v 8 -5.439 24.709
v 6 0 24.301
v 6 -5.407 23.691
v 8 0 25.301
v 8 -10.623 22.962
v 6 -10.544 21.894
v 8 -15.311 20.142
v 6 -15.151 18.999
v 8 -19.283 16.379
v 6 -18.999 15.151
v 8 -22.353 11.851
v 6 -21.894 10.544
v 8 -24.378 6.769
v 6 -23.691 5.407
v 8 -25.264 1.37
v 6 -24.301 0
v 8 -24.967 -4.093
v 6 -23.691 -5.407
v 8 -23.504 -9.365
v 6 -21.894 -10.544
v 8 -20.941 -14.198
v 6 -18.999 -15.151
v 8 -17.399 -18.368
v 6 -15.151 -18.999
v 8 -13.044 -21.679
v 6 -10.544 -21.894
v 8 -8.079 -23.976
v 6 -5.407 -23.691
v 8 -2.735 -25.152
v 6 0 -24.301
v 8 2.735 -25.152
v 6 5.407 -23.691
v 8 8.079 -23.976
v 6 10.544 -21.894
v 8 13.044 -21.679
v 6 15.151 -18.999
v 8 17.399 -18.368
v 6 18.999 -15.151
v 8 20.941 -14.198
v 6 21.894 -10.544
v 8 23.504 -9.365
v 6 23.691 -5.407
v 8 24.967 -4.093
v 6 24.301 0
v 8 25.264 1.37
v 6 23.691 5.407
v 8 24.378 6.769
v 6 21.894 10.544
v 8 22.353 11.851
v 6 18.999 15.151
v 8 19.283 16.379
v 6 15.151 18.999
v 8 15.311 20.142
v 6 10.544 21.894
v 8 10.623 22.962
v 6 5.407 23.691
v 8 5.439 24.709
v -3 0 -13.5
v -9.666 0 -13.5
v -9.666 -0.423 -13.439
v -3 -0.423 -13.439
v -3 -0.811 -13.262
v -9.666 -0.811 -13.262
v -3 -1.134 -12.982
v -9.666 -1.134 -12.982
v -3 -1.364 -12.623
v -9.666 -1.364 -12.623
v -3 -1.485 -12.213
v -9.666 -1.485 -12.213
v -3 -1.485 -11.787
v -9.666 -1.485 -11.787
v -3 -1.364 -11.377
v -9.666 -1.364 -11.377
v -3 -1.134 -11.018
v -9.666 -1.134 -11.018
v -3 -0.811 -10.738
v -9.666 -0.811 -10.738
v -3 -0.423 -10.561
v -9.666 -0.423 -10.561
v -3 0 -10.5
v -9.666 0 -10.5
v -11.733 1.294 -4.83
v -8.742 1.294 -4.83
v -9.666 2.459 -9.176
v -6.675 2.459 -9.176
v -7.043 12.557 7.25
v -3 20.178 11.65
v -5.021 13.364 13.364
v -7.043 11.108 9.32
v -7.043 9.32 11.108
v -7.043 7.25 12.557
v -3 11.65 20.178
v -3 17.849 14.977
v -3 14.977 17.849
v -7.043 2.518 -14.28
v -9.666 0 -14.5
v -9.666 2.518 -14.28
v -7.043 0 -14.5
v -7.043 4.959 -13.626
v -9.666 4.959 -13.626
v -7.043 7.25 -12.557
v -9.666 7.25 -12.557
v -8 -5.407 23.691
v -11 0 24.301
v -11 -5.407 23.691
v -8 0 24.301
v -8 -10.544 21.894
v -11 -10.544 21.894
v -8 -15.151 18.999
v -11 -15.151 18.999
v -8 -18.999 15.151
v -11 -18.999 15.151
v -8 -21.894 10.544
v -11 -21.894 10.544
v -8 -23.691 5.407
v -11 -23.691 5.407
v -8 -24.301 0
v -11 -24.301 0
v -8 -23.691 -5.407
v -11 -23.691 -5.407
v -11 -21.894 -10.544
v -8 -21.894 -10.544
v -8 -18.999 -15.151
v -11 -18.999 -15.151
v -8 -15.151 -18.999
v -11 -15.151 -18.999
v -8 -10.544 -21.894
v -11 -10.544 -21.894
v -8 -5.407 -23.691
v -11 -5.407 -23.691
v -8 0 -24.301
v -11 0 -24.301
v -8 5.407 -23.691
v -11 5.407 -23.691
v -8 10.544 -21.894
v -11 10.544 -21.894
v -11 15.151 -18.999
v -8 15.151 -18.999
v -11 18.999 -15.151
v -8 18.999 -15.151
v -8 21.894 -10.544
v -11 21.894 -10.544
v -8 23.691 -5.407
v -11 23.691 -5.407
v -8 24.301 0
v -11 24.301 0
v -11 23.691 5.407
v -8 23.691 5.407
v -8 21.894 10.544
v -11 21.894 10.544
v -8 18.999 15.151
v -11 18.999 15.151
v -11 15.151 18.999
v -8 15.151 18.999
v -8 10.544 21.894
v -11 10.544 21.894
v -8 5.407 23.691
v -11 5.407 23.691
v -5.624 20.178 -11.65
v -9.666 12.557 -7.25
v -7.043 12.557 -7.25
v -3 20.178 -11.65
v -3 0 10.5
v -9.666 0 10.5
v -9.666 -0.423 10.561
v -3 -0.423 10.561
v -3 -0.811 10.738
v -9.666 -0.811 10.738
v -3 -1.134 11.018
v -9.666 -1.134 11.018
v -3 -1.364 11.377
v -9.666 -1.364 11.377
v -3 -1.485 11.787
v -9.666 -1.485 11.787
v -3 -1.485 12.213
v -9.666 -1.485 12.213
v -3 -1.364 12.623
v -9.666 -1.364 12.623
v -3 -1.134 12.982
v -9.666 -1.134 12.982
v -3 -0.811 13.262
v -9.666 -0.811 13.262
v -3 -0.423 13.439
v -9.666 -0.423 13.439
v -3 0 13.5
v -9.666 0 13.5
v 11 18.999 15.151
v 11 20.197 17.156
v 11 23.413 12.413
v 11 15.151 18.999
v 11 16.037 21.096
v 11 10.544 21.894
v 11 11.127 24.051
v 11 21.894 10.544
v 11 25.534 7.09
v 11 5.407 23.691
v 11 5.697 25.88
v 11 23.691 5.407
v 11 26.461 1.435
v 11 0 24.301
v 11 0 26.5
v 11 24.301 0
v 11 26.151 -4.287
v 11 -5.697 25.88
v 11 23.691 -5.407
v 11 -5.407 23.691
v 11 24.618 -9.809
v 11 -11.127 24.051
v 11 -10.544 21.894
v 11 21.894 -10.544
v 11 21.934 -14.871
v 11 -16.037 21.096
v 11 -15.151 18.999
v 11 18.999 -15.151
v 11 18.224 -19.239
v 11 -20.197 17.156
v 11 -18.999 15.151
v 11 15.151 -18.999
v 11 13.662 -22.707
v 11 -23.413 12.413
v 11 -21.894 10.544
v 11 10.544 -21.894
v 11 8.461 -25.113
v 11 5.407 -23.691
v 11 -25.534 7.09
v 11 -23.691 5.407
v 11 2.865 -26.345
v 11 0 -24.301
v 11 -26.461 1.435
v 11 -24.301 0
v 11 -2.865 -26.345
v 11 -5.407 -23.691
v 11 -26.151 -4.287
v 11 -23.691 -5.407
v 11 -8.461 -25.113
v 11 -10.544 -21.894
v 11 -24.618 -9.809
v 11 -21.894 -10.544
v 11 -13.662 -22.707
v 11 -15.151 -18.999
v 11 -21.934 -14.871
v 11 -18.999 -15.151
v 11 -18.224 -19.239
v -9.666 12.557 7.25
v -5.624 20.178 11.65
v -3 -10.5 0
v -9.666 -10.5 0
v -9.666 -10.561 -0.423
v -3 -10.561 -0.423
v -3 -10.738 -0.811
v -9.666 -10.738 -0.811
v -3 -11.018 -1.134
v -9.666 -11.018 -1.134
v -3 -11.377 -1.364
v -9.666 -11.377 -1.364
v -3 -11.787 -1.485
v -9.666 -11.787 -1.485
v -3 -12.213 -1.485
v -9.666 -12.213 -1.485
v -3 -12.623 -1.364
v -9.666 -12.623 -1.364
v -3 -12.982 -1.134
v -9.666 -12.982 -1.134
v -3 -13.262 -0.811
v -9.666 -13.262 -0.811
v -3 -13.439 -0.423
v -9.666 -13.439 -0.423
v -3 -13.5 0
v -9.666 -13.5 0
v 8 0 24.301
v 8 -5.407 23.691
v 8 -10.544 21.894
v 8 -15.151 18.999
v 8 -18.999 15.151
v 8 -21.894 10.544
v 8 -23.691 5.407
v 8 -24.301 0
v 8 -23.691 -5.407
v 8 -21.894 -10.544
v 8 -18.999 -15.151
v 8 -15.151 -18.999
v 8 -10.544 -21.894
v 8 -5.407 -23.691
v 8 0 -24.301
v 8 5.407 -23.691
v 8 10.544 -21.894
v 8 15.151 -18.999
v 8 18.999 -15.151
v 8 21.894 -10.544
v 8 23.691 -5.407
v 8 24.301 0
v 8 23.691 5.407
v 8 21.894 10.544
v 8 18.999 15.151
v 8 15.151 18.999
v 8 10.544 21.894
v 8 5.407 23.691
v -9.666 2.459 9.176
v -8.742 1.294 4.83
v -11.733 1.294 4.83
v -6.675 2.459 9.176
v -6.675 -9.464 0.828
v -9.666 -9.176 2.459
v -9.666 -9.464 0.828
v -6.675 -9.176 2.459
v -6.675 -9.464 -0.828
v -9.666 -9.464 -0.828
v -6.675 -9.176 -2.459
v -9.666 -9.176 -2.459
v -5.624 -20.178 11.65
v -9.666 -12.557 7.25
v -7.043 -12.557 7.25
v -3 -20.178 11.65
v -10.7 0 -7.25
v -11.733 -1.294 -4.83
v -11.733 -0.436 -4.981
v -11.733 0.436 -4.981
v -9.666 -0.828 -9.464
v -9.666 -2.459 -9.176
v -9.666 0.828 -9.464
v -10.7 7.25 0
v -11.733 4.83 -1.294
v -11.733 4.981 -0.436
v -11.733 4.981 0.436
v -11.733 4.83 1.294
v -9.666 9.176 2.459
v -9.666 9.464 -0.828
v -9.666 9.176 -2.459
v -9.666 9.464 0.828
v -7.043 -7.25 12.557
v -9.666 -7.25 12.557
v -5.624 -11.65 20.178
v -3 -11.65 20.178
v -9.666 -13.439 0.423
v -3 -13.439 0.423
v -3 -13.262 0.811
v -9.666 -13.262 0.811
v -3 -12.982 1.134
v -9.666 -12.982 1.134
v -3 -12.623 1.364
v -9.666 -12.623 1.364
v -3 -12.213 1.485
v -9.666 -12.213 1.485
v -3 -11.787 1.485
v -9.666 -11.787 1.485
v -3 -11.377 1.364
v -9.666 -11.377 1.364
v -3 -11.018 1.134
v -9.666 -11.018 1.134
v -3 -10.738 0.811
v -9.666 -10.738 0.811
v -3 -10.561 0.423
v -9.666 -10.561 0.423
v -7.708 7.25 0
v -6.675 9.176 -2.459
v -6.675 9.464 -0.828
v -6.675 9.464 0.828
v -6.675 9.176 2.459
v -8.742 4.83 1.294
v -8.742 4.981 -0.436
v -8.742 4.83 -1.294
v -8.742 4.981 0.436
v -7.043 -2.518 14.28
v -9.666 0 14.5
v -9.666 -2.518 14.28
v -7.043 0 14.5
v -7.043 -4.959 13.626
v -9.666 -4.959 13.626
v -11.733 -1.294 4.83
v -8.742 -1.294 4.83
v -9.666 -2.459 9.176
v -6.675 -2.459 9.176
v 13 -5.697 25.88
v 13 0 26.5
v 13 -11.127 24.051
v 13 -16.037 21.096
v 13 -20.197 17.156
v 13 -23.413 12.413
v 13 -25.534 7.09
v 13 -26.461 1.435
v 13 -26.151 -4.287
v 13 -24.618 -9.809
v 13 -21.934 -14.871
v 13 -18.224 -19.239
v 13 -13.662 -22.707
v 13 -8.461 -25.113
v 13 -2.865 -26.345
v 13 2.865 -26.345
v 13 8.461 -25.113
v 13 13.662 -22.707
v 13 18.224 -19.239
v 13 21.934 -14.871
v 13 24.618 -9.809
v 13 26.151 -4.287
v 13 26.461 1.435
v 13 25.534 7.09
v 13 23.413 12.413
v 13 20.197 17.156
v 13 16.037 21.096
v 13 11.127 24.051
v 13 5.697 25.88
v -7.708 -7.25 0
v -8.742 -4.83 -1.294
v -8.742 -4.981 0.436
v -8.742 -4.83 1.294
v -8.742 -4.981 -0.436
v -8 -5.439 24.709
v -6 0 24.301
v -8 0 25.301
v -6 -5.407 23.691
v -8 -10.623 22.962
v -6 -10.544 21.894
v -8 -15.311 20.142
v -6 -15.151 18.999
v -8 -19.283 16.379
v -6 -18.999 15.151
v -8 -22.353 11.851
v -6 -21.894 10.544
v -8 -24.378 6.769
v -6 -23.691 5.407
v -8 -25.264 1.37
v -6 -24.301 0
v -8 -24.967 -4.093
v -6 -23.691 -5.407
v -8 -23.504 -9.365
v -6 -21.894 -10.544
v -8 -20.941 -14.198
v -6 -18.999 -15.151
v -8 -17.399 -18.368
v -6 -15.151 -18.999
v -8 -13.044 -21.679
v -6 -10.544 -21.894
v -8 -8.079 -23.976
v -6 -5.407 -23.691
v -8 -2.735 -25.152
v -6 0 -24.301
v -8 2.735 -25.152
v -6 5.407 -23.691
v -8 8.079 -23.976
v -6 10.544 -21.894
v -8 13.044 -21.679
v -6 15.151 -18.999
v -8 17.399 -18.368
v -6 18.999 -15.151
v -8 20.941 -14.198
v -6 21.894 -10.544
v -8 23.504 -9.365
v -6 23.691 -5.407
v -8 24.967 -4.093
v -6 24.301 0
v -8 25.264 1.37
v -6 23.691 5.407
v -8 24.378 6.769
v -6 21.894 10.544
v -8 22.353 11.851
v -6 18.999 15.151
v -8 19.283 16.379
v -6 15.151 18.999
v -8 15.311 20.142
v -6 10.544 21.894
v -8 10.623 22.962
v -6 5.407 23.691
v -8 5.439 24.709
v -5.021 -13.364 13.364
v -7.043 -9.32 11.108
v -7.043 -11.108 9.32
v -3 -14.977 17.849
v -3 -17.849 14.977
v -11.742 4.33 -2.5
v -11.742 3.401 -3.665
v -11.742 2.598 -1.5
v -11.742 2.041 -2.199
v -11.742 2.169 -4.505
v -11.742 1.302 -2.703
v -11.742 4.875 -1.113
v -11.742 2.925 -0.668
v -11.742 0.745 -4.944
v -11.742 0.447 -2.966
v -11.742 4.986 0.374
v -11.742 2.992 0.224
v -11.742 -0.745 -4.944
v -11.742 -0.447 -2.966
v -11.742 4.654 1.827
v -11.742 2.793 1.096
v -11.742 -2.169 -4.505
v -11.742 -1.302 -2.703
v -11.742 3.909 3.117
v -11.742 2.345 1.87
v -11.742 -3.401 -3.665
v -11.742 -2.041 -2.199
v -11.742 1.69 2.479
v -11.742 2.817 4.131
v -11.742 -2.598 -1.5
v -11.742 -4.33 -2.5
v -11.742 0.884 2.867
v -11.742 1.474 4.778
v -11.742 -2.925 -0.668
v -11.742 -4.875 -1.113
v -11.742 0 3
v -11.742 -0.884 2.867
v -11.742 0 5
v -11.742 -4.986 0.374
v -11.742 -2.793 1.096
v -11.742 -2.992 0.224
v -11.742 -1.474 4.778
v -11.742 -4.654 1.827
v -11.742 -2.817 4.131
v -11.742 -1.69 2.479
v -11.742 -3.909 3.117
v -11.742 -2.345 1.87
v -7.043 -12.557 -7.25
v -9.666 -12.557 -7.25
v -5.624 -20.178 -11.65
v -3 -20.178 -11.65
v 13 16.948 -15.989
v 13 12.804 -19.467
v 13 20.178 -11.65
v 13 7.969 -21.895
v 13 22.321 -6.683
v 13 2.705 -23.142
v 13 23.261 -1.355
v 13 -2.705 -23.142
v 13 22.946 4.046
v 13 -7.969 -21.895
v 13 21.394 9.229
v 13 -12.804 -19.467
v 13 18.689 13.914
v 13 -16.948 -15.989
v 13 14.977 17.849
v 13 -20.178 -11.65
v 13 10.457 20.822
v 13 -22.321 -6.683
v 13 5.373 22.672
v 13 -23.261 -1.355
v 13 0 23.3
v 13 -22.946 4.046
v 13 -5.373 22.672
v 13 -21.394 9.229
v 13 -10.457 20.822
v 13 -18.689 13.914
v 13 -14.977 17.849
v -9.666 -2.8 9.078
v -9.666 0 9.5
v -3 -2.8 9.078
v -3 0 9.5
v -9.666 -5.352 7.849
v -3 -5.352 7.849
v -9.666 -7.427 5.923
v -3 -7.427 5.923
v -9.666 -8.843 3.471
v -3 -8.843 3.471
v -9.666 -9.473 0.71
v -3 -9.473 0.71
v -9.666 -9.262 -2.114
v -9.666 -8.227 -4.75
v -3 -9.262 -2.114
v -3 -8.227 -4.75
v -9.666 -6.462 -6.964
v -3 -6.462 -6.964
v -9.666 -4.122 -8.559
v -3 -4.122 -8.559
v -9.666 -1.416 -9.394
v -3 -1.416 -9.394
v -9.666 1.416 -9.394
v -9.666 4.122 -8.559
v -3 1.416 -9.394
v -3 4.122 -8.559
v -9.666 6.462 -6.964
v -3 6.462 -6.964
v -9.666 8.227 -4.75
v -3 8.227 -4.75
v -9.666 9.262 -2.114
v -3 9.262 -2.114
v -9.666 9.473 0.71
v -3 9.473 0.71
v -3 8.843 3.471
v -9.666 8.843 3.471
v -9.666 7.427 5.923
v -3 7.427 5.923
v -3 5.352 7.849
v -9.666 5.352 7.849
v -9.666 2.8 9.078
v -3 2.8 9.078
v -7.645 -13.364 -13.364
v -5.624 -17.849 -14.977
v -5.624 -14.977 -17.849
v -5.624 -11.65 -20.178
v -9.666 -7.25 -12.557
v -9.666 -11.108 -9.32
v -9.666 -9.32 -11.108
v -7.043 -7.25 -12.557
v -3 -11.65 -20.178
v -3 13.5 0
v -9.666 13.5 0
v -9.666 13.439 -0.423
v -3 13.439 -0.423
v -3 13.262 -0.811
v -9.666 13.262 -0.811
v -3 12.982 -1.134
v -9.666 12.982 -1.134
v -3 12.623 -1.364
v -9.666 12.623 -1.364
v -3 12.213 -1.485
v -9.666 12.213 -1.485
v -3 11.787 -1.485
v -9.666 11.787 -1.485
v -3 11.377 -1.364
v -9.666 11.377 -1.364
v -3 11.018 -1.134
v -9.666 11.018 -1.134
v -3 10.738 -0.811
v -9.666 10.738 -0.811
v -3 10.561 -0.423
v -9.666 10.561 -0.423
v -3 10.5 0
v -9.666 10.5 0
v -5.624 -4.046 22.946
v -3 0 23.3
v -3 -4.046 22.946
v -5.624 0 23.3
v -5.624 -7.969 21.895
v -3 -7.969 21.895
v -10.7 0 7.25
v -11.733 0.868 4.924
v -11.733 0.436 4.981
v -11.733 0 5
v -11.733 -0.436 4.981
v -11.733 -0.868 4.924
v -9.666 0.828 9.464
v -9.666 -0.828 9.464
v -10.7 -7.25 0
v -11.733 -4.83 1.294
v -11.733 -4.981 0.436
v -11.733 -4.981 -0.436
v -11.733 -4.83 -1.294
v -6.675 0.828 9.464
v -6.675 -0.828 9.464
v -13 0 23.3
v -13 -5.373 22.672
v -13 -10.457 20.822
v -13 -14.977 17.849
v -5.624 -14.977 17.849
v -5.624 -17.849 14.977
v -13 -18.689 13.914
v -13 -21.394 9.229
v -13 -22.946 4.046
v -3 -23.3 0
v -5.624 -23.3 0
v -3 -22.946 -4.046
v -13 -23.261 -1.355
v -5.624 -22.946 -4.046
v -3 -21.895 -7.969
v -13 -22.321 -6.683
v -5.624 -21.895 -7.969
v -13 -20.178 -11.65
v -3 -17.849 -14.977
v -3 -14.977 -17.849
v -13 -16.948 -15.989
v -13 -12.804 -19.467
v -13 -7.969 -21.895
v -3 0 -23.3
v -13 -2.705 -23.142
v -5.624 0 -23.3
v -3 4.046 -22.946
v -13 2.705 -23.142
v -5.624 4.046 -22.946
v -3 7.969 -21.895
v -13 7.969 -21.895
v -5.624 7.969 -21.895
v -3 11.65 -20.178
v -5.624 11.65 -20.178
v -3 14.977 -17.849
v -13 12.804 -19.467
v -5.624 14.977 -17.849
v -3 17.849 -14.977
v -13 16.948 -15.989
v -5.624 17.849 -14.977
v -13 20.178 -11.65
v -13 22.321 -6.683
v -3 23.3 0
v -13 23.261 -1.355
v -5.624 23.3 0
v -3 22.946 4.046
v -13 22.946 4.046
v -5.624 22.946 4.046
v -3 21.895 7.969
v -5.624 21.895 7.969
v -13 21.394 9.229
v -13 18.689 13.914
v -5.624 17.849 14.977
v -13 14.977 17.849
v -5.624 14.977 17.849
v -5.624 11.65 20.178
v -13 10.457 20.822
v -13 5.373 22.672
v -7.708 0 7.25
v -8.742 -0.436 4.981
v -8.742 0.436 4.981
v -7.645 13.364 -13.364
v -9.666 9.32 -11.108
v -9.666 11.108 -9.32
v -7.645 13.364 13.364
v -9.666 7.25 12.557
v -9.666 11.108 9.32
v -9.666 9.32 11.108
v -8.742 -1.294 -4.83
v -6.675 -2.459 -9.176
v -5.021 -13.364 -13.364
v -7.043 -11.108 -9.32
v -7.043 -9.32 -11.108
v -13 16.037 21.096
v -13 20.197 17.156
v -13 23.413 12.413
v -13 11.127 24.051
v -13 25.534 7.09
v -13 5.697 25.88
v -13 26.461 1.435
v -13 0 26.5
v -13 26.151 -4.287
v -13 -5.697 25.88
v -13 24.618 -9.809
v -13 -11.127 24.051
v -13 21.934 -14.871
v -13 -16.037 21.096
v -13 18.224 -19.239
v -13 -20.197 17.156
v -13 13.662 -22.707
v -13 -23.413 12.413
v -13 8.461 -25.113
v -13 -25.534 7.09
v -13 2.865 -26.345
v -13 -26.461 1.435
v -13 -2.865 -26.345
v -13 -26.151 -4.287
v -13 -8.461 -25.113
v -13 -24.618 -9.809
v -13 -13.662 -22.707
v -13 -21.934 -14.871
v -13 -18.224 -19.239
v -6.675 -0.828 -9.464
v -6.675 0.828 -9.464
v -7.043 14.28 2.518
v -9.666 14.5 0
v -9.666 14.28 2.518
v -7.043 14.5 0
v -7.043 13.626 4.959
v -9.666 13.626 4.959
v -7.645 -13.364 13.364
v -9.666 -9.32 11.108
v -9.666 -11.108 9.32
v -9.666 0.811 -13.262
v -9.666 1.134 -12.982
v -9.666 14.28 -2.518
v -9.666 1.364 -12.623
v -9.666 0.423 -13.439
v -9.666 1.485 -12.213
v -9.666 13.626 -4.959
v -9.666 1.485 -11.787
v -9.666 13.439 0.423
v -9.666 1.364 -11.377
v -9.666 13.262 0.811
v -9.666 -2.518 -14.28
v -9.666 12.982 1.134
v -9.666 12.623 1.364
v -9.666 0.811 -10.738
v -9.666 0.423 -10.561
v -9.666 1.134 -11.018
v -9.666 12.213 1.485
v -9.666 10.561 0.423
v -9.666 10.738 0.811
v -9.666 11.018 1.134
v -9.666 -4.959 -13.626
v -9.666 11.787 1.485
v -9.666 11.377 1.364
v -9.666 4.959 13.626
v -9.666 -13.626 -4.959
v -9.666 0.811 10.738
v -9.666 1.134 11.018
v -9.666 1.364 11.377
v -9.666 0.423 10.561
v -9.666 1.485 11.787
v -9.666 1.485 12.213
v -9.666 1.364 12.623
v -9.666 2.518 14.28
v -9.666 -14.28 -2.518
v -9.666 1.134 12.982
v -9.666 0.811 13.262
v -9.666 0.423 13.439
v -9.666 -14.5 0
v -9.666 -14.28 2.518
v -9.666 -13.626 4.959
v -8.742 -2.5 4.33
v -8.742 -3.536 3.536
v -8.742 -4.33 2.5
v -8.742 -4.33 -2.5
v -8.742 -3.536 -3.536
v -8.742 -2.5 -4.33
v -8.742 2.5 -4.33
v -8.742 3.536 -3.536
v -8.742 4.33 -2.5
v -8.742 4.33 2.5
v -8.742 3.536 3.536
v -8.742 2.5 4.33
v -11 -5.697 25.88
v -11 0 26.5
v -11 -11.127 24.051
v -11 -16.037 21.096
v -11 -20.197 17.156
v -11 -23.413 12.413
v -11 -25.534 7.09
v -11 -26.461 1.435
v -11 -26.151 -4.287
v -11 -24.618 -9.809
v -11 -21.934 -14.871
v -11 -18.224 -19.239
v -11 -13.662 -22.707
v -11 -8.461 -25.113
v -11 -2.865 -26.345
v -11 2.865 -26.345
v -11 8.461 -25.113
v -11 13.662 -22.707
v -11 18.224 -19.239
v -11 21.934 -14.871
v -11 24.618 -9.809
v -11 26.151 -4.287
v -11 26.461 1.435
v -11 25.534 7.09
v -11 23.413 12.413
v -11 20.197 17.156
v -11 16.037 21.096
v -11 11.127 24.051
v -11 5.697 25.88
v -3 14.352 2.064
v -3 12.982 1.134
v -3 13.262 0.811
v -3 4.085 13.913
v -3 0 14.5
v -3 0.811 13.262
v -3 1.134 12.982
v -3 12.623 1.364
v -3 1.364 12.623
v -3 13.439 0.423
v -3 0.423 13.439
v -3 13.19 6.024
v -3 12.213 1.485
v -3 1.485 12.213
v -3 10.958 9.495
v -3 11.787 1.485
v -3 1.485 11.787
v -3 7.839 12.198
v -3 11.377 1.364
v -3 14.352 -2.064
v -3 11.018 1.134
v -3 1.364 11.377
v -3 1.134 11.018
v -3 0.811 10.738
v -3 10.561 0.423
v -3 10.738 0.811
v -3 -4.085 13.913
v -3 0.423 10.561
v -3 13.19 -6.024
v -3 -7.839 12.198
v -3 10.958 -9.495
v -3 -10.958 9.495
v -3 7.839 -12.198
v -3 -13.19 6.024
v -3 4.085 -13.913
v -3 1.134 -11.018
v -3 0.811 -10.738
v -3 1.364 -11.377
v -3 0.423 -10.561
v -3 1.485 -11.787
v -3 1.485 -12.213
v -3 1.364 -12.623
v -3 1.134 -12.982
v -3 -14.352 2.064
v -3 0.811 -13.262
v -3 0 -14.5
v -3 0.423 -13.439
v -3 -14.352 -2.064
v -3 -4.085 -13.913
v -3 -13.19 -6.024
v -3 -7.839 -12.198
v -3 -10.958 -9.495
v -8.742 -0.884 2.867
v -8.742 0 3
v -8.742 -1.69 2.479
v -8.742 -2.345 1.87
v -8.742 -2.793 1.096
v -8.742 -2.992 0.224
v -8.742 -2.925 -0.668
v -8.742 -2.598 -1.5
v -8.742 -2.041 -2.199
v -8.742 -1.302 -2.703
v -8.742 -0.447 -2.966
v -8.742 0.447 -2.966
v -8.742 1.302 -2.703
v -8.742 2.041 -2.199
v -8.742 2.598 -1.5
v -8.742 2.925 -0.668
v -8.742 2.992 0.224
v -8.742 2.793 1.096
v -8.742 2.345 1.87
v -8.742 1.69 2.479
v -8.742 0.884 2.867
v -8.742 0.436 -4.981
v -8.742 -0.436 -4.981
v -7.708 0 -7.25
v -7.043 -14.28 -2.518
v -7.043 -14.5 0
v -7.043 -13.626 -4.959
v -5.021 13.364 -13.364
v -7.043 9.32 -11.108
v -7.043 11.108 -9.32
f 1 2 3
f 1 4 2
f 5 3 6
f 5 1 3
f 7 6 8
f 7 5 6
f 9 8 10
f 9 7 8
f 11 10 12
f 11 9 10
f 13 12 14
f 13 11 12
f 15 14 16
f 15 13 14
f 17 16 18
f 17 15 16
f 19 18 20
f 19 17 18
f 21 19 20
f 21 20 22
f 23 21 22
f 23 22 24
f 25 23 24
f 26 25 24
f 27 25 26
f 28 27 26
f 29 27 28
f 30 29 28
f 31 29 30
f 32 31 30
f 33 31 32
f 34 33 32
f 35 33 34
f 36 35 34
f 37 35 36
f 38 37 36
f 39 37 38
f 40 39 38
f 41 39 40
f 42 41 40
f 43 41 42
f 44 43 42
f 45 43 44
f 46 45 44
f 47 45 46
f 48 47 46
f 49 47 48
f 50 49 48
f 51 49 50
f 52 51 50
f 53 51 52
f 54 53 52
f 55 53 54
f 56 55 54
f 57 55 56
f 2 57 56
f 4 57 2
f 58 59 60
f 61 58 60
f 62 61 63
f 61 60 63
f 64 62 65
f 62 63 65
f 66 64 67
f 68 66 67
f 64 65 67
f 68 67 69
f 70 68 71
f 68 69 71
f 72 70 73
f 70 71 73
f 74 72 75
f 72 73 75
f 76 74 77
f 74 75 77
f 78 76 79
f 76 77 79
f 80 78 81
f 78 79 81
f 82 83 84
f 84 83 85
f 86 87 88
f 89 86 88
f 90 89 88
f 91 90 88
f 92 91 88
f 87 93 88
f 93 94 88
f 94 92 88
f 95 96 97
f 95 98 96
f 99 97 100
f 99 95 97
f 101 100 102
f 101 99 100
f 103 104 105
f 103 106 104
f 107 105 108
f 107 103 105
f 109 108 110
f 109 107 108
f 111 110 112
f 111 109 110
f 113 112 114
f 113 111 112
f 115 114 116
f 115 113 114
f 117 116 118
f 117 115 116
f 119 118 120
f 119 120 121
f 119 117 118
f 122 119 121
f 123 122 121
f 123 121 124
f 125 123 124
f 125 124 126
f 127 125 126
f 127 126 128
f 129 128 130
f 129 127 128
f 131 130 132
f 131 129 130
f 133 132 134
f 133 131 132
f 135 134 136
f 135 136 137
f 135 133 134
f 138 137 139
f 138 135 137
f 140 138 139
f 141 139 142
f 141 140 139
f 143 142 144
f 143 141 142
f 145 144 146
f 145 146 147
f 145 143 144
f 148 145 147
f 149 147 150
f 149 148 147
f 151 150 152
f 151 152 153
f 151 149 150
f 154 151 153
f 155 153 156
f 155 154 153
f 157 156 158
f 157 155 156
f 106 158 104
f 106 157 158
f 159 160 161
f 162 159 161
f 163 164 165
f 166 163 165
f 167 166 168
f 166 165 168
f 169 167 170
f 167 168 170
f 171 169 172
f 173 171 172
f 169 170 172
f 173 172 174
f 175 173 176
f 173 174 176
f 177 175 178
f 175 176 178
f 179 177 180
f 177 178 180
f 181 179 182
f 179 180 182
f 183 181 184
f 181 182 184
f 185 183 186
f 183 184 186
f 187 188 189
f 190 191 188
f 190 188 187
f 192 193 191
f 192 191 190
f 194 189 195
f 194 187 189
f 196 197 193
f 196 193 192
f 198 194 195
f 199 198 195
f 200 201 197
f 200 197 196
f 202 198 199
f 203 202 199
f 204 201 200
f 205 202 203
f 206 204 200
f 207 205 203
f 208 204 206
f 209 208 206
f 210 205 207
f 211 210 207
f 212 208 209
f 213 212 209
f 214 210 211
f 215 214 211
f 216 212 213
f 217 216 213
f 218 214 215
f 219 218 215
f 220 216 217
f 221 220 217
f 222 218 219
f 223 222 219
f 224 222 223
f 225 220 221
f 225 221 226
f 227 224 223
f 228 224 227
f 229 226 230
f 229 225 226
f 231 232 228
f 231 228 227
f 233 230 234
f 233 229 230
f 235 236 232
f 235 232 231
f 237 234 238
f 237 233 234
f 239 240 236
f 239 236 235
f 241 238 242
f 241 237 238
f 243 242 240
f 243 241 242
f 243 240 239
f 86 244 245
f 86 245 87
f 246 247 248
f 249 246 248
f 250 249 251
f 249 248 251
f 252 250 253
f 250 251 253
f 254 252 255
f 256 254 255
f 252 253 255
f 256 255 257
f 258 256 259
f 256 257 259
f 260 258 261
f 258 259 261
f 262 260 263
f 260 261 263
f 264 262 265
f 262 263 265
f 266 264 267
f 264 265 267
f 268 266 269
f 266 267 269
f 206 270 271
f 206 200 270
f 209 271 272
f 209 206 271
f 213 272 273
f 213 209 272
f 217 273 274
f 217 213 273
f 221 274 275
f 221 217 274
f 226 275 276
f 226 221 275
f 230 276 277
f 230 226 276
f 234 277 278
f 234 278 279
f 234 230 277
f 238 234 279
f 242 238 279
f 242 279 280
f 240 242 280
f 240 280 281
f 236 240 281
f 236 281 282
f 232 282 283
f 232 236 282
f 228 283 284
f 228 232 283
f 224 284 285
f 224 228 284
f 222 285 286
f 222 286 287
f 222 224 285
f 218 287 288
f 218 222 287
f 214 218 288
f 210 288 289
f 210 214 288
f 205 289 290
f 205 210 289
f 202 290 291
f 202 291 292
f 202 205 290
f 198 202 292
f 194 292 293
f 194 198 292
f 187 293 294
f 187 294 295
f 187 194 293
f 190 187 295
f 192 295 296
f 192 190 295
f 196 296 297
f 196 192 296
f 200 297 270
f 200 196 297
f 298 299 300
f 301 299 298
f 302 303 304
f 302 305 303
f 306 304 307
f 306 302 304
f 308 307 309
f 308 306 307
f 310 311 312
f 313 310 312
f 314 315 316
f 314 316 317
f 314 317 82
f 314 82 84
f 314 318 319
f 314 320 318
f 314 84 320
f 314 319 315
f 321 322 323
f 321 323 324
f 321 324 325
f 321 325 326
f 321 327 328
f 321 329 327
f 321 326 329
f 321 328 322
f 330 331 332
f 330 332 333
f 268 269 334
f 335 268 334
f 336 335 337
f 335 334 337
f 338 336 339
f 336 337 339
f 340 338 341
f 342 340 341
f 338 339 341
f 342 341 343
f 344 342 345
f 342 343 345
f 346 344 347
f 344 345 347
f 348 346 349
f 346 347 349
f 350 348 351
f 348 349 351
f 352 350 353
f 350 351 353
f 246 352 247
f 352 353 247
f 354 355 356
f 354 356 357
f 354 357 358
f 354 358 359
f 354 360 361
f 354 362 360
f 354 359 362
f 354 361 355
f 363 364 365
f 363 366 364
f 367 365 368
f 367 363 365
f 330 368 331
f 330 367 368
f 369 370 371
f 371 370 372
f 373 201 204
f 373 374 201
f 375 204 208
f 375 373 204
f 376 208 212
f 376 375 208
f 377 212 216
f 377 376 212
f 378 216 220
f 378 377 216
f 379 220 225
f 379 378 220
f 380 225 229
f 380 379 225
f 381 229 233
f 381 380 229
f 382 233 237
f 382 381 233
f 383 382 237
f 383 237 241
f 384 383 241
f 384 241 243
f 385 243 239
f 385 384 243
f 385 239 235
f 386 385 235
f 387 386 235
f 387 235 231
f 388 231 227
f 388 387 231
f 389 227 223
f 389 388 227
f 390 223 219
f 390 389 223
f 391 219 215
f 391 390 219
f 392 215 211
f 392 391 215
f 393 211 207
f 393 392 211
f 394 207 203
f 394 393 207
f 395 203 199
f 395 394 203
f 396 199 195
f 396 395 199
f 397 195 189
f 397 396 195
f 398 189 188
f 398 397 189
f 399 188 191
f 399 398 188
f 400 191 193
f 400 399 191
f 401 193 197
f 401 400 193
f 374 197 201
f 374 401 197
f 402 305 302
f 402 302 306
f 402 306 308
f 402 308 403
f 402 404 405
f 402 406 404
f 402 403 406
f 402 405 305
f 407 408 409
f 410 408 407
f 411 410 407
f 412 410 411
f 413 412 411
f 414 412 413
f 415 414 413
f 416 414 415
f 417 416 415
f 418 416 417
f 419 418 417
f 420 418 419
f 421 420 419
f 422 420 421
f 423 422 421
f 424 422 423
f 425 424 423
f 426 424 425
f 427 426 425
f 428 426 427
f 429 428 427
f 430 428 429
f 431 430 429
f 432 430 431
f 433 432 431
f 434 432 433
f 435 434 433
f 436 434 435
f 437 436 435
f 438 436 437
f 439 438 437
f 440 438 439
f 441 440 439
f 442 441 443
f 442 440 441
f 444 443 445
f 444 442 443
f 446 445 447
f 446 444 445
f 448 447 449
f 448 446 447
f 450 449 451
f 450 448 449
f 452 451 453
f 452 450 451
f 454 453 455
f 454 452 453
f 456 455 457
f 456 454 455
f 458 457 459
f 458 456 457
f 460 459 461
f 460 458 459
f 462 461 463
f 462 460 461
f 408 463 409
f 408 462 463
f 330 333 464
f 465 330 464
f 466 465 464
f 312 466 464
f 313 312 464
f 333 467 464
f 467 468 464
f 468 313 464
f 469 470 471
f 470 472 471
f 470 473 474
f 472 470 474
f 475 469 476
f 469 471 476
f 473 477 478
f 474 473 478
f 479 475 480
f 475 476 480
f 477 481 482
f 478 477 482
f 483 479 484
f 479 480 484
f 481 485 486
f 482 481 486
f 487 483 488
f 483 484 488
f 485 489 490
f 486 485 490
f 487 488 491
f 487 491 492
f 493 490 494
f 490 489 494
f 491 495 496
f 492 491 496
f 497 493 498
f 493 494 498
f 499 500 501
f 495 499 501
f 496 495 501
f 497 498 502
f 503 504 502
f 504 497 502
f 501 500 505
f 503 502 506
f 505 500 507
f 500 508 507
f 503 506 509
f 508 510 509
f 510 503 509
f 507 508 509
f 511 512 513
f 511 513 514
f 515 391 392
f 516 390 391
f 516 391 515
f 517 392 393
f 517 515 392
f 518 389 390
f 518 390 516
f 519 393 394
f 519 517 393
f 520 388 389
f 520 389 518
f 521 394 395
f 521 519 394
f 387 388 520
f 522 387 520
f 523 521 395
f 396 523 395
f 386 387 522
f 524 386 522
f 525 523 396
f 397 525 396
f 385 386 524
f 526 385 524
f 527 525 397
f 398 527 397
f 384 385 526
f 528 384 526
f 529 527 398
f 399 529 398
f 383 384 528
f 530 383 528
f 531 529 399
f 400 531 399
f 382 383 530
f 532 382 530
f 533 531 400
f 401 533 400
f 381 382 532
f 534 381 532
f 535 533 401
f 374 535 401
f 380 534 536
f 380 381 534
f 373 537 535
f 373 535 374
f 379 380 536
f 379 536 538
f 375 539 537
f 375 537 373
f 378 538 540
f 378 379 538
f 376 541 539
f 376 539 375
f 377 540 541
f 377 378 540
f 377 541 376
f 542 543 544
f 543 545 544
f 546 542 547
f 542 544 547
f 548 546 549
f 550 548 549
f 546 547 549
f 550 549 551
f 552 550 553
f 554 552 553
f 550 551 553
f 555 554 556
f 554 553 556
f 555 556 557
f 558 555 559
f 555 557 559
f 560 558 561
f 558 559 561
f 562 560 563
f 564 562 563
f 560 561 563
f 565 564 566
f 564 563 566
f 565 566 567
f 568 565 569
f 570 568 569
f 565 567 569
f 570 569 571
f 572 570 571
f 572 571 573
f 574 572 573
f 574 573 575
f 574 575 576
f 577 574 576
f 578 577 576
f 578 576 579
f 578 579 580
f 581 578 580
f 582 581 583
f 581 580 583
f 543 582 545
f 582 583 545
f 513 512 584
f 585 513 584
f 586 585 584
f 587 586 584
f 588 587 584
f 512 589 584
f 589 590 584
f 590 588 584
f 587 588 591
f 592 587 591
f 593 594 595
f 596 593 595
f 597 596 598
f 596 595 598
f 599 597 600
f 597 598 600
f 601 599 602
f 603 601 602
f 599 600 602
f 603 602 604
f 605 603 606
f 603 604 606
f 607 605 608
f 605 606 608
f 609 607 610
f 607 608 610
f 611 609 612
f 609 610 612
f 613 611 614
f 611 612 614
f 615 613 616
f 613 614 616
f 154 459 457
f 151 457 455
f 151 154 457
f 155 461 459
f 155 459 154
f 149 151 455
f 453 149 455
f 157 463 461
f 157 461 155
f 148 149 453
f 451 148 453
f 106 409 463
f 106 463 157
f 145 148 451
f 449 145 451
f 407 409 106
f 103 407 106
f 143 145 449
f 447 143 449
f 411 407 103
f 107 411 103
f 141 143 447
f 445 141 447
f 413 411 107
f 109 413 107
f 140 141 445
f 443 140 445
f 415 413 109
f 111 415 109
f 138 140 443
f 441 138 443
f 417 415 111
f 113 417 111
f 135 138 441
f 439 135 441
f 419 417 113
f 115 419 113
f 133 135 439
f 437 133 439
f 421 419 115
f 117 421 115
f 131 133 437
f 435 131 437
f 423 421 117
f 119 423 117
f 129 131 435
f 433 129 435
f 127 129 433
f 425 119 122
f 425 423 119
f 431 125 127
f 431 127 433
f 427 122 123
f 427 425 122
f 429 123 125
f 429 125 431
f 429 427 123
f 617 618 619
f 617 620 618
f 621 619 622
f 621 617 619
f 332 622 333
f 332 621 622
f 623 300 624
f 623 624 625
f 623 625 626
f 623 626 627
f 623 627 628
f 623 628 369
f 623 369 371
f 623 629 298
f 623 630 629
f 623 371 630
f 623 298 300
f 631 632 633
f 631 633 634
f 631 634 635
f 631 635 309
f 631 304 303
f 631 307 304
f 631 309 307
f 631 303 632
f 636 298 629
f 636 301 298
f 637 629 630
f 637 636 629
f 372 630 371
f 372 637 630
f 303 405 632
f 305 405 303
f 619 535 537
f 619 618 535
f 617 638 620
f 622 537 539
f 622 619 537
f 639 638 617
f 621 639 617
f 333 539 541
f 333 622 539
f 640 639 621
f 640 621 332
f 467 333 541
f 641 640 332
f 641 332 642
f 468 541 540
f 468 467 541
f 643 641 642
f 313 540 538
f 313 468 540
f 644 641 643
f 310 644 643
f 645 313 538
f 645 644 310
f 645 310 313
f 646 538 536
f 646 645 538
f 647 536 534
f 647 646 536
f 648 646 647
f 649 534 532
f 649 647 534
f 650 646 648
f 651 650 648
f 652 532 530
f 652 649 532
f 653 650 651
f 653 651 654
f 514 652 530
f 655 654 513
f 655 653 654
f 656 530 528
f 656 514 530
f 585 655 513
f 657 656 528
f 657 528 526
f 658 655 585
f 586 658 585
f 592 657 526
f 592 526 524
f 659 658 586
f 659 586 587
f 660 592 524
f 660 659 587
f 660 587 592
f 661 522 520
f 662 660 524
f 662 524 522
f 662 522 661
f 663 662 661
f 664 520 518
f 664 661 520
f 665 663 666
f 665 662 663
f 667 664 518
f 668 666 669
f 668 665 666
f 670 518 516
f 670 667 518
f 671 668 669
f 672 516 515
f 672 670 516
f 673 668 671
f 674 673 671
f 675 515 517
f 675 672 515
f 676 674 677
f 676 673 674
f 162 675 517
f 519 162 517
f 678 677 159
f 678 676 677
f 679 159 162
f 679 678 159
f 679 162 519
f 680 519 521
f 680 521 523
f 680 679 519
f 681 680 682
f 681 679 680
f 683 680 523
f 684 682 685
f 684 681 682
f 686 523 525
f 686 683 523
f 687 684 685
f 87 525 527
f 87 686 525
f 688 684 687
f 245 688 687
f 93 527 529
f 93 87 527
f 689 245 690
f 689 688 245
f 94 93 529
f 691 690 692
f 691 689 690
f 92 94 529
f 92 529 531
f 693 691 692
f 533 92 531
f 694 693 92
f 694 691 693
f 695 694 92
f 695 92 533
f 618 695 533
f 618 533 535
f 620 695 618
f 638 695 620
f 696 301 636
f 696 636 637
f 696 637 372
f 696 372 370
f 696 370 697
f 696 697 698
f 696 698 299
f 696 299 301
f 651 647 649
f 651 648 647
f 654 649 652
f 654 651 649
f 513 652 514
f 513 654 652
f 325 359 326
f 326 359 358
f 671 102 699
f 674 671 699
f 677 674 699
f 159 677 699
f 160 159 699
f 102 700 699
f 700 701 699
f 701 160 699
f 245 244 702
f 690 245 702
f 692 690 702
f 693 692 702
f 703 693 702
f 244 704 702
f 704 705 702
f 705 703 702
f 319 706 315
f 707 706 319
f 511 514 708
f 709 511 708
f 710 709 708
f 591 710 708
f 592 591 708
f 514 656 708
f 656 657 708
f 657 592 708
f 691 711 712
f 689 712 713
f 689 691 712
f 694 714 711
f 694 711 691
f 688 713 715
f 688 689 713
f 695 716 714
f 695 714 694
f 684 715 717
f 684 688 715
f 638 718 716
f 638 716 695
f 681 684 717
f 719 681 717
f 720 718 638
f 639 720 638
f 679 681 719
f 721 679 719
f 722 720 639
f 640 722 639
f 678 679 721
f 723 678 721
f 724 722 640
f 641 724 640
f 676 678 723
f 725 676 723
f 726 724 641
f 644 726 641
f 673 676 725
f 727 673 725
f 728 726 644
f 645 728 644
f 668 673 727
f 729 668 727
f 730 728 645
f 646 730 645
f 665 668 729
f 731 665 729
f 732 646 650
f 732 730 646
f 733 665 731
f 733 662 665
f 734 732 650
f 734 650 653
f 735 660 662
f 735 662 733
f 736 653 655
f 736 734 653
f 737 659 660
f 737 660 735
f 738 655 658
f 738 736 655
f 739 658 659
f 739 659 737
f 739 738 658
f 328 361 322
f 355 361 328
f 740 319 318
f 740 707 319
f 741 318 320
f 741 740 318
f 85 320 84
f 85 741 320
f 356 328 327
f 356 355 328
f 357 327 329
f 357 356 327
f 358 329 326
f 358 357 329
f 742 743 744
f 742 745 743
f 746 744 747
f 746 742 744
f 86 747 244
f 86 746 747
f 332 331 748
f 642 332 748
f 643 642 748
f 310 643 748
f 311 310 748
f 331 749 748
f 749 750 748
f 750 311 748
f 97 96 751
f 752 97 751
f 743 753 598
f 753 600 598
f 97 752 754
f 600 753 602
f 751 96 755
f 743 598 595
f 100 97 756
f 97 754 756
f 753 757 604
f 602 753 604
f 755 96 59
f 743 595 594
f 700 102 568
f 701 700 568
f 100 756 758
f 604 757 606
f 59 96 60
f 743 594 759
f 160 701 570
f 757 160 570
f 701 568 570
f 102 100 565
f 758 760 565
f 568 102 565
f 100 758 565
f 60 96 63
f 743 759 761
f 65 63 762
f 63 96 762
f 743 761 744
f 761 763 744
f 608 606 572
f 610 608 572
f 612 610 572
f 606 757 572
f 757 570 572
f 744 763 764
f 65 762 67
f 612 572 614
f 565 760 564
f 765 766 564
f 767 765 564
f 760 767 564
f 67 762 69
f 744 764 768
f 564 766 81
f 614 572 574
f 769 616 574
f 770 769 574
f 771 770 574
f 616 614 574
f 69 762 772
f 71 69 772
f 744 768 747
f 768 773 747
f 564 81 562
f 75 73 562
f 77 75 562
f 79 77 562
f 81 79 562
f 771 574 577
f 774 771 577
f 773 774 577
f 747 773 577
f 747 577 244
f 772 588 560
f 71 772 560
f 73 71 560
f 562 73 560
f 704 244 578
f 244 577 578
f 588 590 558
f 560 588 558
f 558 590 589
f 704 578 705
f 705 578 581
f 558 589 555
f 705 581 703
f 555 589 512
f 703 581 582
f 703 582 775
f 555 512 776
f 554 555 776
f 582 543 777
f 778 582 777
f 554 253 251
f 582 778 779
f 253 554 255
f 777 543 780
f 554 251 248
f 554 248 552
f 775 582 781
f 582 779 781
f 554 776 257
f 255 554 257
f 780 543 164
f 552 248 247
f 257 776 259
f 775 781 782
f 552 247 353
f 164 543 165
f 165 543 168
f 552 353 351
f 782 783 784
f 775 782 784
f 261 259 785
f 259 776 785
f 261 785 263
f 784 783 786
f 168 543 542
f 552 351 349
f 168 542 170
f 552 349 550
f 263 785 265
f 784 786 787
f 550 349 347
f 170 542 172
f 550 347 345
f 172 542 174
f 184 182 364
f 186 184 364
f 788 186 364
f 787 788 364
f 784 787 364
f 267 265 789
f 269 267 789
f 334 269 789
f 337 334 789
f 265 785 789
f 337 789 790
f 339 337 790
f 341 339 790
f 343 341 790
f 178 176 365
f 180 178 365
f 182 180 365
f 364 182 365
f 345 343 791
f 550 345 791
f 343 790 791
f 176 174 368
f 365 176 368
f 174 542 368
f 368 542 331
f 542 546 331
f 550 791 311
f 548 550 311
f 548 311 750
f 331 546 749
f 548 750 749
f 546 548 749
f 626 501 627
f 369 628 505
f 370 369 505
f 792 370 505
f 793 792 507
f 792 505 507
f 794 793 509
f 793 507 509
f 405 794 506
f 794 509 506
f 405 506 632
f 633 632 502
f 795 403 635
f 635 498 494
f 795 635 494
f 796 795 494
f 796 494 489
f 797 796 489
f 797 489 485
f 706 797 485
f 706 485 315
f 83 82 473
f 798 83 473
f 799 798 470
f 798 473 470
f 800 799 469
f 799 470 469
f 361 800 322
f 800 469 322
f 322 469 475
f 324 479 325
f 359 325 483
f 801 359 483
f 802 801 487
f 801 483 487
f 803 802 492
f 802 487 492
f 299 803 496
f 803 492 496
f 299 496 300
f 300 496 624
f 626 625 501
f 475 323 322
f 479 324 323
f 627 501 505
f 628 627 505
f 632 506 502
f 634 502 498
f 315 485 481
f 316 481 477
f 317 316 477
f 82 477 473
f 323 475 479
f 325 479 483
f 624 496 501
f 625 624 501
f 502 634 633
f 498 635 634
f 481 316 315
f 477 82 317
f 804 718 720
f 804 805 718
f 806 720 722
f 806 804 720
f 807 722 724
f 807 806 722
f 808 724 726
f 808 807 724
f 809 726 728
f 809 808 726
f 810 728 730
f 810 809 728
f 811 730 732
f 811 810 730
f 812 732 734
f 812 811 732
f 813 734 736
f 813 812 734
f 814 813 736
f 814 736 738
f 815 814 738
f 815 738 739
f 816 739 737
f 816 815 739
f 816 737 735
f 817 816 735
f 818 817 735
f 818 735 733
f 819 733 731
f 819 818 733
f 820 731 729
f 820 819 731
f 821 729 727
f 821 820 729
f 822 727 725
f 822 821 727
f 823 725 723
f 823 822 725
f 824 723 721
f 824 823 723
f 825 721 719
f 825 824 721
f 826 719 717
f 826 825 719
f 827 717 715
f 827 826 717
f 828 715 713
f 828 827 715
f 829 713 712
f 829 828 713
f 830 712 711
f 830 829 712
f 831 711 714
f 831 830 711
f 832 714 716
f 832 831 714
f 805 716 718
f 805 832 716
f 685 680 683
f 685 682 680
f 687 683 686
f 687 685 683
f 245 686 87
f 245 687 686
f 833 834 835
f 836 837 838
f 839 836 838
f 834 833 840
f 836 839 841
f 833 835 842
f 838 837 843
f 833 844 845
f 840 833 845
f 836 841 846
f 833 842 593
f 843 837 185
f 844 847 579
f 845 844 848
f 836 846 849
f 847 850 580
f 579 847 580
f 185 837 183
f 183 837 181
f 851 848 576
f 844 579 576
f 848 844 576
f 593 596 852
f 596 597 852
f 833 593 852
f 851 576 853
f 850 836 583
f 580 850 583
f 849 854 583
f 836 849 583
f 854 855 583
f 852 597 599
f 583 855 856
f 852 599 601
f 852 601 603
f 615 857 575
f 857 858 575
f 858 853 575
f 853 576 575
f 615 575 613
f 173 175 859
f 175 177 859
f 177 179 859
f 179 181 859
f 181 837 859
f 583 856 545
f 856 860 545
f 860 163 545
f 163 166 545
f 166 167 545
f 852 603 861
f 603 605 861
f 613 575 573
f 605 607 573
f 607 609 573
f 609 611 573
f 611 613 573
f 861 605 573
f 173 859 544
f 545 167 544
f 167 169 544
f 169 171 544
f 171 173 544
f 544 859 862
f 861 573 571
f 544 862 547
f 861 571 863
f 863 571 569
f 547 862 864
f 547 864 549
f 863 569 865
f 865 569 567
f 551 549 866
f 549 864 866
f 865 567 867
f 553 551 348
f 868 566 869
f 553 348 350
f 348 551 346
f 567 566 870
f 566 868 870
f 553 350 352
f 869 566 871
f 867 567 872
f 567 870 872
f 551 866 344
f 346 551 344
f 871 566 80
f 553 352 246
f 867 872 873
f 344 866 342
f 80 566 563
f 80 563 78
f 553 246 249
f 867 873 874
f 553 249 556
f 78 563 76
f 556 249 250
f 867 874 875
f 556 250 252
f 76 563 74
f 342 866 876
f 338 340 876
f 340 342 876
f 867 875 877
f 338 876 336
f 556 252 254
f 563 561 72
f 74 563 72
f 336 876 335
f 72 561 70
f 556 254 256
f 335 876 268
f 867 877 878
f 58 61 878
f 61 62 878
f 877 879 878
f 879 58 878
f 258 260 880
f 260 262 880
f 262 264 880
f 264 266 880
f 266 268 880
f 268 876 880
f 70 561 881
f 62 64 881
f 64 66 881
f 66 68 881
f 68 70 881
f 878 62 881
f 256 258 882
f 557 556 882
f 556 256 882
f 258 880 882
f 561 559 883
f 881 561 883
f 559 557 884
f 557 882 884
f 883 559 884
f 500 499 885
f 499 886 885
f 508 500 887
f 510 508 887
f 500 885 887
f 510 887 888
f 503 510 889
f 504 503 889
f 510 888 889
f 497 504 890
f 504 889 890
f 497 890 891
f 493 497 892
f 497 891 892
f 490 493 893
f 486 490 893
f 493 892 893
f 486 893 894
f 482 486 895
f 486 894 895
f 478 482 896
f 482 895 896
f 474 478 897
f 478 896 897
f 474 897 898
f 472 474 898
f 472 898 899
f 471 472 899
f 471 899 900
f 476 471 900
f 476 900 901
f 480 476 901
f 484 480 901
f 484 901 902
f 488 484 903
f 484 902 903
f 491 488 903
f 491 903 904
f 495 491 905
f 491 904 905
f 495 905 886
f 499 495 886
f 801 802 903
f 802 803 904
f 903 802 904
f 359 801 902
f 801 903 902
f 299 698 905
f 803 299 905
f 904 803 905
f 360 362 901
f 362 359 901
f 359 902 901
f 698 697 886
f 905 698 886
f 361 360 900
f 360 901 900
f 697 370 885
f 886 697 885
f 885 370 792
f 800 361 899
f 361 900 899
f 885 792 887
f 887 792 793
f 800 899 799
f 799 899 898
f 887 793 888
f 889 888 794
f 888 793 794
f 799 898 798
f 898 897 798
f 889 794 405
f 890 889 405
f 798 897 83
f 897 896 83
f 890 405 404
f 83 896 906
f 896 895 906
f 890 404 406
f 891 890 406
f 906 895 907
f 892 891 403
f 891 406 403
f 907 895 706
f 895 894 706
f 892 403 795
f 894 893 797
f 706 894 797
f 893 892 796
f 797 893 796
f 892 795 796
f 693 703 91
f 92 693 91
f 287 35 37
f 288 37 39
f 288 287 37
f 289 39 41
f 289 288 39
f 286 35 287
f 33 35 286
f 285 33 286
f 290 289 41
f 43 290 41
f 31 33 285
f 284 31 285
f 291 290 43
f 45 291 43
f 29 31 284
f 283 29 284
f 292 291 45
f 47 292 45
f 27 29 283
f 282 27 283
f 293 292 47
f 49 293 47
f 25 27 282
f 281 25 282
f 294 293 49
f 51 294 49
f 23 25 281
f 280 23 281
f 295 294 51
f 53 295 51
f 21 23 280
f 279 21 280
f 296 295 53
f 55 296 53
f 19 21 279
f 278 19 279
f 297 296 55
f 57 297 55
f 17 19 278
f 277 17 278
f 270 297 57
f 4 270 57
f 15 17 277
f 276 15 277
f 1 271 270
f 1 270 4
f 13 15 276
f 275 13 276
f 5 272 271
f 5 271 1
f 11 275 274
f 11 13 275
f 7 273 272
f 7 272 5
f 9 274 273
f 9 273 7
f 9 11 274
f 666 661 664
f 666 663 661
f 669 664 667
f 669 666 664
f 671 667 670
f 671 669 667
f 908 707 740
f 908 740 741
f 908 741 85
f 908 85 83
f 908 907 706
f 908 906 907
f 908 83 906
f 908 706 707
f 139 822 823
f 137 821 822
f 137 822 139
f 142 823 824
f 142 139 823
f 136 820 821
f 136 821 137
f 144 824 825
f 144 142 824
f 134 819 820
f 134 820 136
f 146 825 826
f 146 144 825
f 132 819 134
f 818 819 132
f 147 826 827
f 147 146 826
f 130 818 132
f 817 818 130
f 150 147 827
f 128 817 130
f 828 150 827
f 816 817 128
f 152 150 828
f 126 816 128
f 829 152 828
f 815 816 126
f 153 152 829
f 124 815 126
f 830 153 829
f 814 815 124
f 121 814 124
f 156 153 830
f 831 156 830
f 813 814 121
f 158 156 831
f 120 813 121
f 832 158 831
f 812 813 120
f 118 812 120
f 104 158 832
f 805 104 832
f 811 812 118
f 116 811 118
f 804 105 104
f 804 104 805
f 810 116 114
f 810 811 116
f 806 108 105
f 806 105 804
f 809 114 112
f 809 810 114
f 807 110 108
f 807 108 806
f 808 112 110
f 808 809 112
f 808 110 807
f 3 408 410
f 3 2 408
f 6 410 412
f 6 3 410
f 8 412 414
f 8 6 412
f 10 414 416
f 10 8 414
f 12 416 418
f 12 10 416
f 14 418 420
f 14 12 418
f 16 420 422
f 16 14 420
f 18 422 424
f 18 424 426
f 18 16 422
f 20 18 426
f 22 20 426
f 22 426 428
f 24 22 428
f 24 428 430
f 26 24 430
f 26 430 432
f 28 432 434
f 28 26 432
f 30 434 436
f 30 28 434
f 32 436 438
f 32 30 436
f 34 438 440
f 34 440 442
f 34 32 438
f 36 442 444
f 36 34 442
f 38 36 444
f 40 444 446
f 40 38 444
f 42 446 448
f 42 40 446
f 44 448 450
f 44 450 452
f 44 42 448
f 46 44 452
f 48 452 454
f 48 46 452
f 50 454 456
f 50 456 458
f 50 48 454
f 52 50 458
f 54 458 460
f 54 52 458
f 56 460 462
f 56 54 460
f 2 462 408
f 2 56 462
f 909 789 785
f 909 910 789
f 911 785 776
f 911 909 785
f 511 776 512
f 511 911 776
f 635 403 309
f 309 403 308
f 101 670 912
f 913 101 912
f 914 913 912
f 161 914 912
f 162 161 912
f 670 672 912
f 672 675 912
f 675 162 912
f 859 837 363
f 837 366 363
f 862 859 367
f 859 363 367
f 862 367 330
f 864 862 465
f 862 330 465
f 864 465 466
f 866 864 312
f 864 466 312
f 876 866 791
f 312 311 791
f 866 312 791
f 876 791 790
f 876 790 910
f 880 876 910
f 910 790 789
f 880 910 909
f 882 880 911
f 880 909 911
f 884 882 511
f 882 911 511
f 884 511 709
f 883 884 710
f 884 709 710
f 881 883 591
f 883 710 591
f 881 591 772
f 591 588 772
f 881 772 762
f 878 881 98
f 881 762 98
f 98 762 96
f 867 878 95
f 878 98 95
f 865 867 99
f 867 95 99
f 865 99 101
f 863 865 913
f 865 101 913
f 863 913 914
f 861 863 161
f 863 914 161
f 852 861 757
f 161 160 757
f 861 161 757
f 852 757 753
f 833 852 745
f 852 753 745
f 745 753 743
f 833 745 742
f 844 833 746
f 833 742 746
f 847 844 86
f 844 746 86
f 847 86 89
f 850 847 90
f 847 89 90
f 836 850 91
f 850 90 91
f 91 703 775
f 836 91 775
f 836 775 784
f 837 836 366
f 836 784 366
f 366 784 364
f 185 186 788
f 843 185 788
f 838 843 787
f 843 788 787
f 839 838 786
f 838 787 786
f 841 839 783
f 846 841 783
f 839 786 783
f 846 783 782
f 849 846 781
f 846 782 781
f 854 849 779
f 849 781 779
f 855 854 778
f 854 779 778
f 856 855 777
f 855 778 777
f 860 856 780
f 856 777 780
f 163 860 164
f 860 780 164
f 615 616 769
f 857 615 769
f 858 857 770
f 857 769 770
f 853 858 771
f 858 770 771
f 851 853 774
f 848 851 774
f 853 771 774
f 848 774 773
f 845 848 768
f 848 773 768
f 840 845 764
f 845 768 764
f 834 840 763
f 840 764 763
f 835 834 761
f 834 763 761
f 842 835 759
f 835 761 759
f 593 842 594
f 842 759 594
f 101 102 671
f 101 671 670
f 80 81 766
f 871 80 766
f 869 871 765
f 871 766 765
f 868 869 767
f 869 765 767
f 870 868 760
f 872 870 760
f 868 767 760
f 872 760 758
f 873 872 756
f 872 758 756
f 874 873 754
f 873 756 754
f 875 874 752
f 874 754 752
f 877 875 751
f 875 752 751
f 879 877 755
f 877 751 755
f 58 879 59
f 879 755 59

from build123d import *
from build123d.topology import SkipClean

# Parameters (mm, degrees)
REVOLVE_3_ANGLE          = 60
PATTERN_CIRCULAR_3_COUNT = 4
REVOLVE_5_ANGLE          = 30
PATTERN_CIRCULAR_2_COUNT = 4
CUT_REVOLVE_1_ANGLE      = 30
PATTERN_CIRCULAR_4_COUNT = 4
CUT_EXTRUDE_1_DEPTH      = 10
PATTERN_CIRCULAR_5_COUNT = 4


# Read off the part's stored shape, not the designer's step: 旋转5
with BuildPart() as part:
    # 草图4 → 旋转1 (revolve)
    with BuildSketch(Plane(origin=(0, 0, 0), x_dir=(1, 0, 0), z_dir=(0, 1, 0)), mode=Mode.PRIVATE) as revolve_1_sk:
        Polygon((-13, 26.5), (-11, 26.5), (-11, 24.300653513), (-8, 24.300653513), (-8, 25.300653513), (-6, 24.300653513), (6, 24.300653513), (8, 25.300653513), (8, 24.300653513), (11, 24.300653513), (11, 26.5), (13, 26.5), (13, 23.3), (-13, 23.3), align=None)
    revolve(revolve_1_sk.sketch.rotate(Axis((0, 0, 0), (1, 0, 0)), 180), axis=Axis((0, 0, 0), (1, 0, 0)))



with BuildPart() as body_2:
    # 草图4<3> → 旋转2 (revolve)
    with BuildSketch(Plane(origin=(0, 0, 0), x_dir=(1, 0, 0), z_dir=(0, 1, 0)), mode=Mode.PRIVATE) as revolve_2_sk:
        Polygon((-7.042513466, 14.5), (-9.666285329, 14.5), (-9.666285329, 9.5), (-7.042513466, 9.5), (-6.674715481, 9.5), (-3, 9.5), (-3, 12), (-3, 14.5), align=None)
    revolve(revolve_2_sk.sketch.rotate(Axis((0, 0, 0), (1, 0, 0)), 180), axis=Axis((0, 0, 0), (1, 0, 0)))


with BuildPart() as part_1:
    add(part.part)

    add(body_2.part)  # 旋转3 merges body 2
    # 草图4<4> → 旋转3 (revolve)
    with BuildSketch(Plane(origin=(0, 0, 0), x_dir=(1, 0, 0), z_dir=(0, 1, 0))):
        Polygon((-3, 23.3), (-5.623771863, 23.3), (-9.666285329, 14.5), (-7.042513466, 14.5), align=None)
    revolve_3 = revolve(axis=Axis((0, 0, 0), (1, 0, 0)), revolution_arc=REVOLVE_3_ANGLE)

    # 阵列(圆周)3: 旋转3 ×4 about axis
    pattern_circular_3_axis = Axis((-9.666285329, 0, 0), (-1, 0, 0))
    for i in range(1, PATTERN_CIRCULAR_3_COUNT):
        add(revolve_3.rotate(pattern_circular_3_axis, i * 360 / PATTERN_CIRCULAR_3_COUNT))

    # 草图4<7> → 切除-旋转1 (revolve, cut)
    with SkipClean():  # the faces are left unmerged after this step: merging them gives an invalid solid
        with BuildSketch(Plane(origin=(0, 0, 0), x_dir=(1, 0, 0), z_dir=(0, 1, 0))):
            Polygon((-3, 23.3), (-5.623771863, 23.3), (-9.666285329, 14.5), (-7.042513466, 14.5), align=None)
        cut_revolve_1 = revolve(axis=Axis((0, 0, 0), (1, 0, 0)), revolution_arc=CUT_REVOLVE_1_ANGLE, mode=Mode.SUBTRACT)

    # 阵列(圆周)4: 切除-旋转1 ×4 about axis
    with SkipClean():  # the faces are left unmerged after this step: merging them gives an invalid solid
        pattern_circular_4_axis = Axis((-9.666285329, 0, 0), (-1, 0, 0))
        for i in range(1, PATTERN_CIRCULAR_4_COUNT):
            add(cut_revolve_1.rotate(pattern_circular_4_axis, i * 360 / PATTERN_CIRCULAR_4_COUNT), mode=Mode.SUBTRACT)

    # 草图6 → 切除-拉伸1 (cut)
    with SkipClean():  # the faces are left unmerged after this step: merging them gives an invalid solid
        with BuildSketch(Plane.ZY.offset(11.741909867)):
            with BuildLine():
                ThreePointArc((-13.5, 0), (-12, -1.5), (-10.5, 0))
                Line((-10.5, 0), (-12, 0))
                Line((-12, 0), (-13.5, 0))
            make_face()
            with BuildLine():
                Line((-12, 0), (-10.5, 0))
                ThreePointArc((-10.5, 0), (-12, 1.5), (-13.5, 0))
                Line((-13.5, 0), (-12, 0))
            make_face()
        cut_extrude_1 = extrude(amount=-CUT_EXTRUDE_1_DEPTH, mode=Mode.SUBTRACT)

    # 阵列(圆周)5: 切除-拉伸1 ×4 about axis
    with SkipClean():  # the faces are left unmerged after this step: merging them gives an invalid solid
        pattern_circular_5_axis = Axis((0, 0, 0), (1, 0, 0))
        for i in range(1, PATTERN_CIRCULAR_5_COUNT):
            add(cut_extrude_1.rotate(pattern_circular_5_axis, i * 360 / PATTERN_CIRCULAR_5_COUNT), mode=Mode.SUBTRACT)


with BuildPart() as body_2_2:
    # 草图4<5> → 旋转4 (revolve)
    with BuildSketch(Plane(origin=(0, 0, 0), x_dir=(1, 0, 0), z_dir=(0, 1, 0)), mode=Mode.PRIVATE) as revolve_4_sk:
        Polygon((-8.741909867, 5), (-11.733479715, 5), (-11.741909867, 5), (-11.741909867, 3), (-8.741909867, 3), align=None)
    revolve(revolve_4_sk.sketch.rotate(Axis((0, 0, 0), (1, 0, 0)), 180), axis=Axis((0, 0, 0), (1, 0, 0)))

    # 旋转5 outline → 旋转5 (revolve)
    with BuildSketch(Plane(origin=(0, 0, 0), x_dir=(0, -0.25881904510252235, -0.9659258262890679), z_dir=(0, -0.9659258262890679, 0.25881904510252235))):
        Polygon((9.5, -6.674715481), (5, -8.741909867), (5, -11.733479715), (9.5, -9.666285329), align=None)
    revolve_5 = revolve(axis=Axis((0, 0, 0), (1, 0, 0)), revolution_arc=REVOLVE_5_ANGLE)

    # 阵列(圆周)2: 旋转5 ×4 about axis
    pattern_circular_2_axis = Axis((-11.741909867, 0, 0), (-1, 0, 0))
    for i in range(1, PATTERN_CIRCULAR_2_COUNT):
        add(revolve_5.rotate(pattern_circular_2_axis, i * 360 / PATTERN_CIRCULAR_2_COUNT))


solid = Compound([part_1.part, body_2_2.part])
